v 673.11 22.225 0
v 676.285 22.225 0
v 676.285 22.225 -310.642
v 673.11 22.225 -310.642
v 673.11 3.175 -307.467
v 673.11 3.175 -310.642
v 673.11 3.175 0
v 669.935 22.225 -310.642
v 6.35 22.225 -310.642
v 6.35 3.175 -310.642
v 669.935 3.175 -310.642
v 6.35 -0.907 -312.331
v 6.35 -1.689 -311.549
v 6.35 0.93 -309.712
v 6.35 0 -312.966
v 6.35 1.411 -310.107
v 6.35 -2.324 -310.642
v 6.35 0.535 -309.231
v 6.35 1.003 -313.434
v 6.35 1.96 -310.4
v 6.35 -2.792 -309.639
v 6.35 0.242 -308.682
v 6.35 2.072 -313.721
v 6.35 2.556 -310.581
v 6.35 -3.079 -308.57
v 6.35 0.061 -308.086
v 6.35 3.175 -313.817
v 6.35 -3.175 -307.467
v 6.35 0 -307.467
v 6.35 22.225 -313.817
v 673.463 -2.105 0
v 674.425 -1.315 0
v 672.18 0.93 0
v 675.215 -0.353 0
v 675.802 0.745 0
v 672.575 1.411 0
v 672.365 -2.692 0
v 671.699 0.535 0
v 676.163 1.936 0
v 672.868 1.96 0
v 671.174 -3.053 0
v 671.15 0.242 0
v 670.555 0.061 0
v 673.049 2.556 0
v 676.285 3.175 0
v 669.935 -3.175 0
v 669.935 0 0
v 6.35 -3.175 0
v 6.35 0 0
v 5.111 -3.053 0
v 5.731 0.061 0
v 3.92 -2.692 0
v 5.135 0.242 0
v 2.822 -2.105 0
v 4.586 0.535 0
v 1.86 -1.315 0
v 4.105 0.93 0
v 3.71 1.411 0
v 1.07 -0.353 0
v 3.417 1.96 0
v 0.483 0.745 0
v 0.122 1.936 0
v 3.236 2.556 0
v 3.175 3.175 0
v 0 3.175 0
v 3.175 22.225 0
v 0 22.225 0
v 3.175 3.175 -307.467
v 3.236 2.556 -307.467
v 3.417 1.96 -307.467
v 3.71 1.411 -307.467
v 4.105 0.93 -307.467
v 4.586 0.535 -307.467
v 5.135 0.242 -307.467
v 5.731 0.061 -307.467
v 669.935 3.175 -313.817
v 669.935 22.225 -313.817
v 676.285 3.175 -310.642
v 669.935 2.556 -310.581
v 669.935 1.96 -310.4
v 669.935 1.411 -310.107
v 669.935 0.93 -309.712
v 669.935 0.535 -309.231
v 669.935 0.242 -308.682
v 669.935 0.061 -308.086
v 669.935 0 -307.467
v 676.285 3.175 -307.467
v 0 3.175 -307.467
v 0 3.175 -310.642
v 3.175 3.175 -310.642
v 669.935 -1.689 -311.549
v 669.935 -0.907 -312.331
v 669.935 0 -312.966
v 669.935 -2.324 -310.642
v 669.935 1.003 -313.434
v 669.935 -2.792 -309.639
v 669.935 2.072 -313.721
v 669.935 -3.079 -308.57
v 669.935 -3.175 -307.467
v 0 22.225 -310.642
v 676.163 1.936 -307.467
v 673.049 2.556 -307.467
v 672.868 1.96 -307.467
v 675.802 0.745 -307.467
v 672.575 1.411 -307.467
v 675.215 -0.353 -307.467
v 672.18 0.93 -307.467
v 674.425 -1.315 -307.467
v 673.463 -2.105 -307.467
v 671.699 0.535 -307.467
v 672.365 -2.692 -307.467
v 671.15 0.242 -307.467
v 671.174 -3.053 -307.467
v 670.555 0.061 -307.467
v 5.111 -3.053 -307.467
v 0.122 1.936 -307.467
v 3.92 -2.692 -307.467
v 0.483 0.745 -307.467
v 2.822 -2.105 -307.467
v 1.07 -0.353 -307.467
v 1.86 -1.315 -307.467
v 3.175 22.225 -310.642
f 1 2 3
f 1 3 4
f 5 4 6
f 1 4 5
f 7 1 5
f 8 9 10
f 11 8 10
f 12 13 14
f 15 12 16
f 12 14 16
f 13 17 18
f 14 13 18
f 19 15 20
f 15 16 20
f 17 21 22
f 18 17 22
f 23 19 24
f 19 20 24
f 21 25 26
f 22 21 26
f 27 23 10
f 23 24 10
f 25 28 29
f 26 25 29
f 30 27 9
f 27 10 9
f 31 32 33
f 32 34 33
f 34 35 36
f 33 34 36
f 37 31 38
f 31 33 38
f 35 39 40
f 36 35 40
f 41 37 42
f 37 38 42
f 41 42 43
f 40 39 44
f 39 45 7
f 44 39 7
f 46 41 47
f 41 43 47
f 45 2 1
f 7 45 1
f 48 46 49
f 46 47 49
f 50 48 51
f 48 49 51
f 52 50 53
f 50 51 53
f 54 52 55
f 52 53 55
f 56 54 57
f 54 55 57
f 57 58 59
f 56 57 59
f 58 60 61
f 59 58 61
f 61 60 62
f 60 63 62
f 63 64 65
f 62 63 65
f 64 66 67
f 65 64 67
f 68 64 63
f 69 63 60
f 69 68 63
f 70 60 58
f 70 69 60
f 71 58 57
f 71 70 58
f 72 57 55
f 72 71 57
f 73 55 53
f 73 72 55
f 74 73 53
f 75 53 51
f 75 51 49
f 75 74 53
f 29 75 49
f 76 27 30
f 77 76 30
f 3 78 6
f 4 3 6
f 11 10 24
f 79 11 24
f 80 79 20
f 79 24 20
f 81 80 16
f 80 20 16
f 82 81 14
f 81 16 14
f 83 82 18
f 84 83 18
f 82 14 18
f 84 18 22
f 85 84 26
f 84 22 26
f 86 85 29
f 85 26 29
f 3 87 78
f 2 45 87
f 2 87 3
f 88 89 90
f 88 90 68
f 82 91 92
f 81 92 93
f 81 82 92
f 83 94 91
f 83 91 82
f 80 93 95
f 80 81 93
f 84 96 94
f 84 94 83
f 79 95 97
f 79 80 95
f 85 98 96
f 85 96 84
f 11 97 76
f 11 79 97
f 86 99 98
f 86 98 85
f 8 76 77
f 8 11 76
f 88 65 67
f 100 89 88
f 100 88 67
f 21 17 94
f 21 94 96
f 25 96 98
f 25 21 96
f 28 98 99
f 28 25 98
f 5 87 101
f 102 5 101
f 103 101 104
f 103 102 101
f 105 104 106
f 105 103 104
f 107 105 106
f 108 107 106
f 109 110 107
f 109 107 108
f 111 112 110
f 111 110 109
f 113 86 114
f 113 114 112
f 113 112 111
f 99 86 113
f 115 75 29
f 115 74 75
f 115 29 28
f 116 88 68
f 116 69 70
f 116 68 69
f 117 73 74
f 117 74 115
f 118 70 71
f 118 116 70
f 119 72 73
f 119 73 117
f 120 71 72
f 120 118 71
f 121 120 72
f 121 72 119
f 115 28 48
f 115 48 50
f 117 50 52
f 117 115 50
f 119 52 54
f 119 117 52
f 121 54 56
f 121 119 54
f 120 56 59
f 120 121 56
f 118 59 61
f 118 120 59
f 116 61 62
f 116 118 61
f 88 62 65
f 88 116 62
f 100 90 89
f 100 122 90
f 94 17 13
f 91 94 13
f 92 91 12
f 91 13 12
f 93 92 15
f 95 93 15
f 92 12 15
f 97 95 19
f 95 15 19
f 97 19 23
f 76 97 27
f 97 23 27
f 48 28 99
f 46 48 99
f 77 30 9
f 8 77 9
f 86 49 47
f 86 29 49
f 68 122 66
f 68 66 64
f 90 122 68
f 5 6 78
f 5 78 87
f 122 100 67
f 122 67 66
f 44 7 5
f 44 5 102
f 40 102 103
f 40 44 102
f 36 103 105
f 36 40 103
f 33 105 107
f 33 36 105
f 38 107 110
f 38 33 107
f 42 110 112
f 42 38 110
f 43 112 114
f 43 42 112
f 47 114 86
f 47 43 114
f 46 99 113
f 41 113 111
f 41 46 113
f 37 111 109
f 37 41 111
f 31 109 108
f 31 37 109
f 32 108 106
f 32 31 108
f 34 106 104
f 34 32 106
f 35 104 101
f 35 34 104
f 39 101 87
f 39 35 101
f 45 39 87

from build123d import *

# Parameters (mm, degrees)
SKETCH1_W                      = 676.28516
SKETCH1_H                      = 310.642
BASE_FLANGE1_DEPTH             = 3.175
EDGE_FLANGE2_STRIP_W           = 19.05
EDGE_FLANGE2_STRIP_H           = 3.175
EDGE_FLANGE2_STRIP_CUT_DEPTH   = 310.642
EDGE_FLANGE2_STRIP_2_W         = 19.05
EDGE_FLANGE2_STRIP_2_H         = 3.175
EDGE_FLANGE2_STRIP_CUT_2_DEPTH = 310.642
EDGE_FLANGE2_DEPTH             = 310.642
EDGE_FLANGE2_BEND_DEPTH        = 310.642
EDGE_FLANGE3_DEPTH             = 676.28516
EDGE_FLANGE3_2_DEPTH           = 6.35
EDGE_FLANGE3_START             = 669.93516
EDGE_FLANGE3_3_DEPTH           = 6.35
EDGE_FLANGE3_START_2           = 6.35
EDGE_FLANGE3_4_DEPTH           = 663.58516


# Read off the part's stored shape, not the designer's step: Edge-Flange3
# Sheet-metal steps are written as plain solids
with BuildPart() as part:
    # Sketch1 → Base-Flange1 (new body)
    with BuildSketch(Plane(origin=(0, 0, 0), x_dir=(1, 0, 0), z_dir=(0, 1, 0))):
        with Locations((338.14258, 155.321)):
            Rectangle(SKETCH1_W, SKETCH1_H)
    extrude(amount=-BASE_FLANGE1_DEPTH)

    # Edge-Flange2 strip (across the edge) → Edge-Flange2 strip cut (cut)
    with BuildSketch(Plane(origin=(676.28516, 0, 0), x_dir=(-1, 0, 0), z_dir=(0, 0, -1))):
        with Locations((-3.175, -1.5875)):
            Rectangle(EDGE_FLANGE2_STRIP_W, EDGE_FLANGE2_STRIP_H)
    extrude(amount=EDGE_FLANGE2_STRIP_CUT_DEPTH, mode=Mode.SUBTRACT)

    # Edge-Flange2 strip 2 (across the edge) → Edge-Flange2 strip cut 2 (cut)
    with BuildSketch(Plane.XY.offset(-310.642)):
        with Locations((-3.175, -1.5875)):
            Rectangle(EDGE_FLANGE2_STRIP_2_W, EDGE_FLANGE2_STRIP_2_H)
    extrude(amount=EDGE_FLANGE2_STRIP_CUT_2_DEPTH, mode=Mode.SUBTRACT)

    # Edge-Flange2 section (across the edge) → Edge-Flange2 (add)
    with BuildSketch(Plane(origin=(676.28516, 0, 0), x_dir=(-1, 0, 0), z_dir=(0, 0, -1))):
        with BuildLine():
            Line((0, 3.175), (0, 22.225))
            Line((0, 22.225), (3.175, 22.225))
            Line((3.175, 22.225), (3.175, 3.175))
            ThreePointArc((3.175, 3.175), (4.10493597, 0.92993597), (6.35, 0))
            Line((6.35, 0), (6.35, -3.175))
            ThreePointArc((6.35, -3.175), (1.859871939, -1.315128061), (0, 3.175))
        make_face()
    extrude(amount=EDGE_FLANGE2_DEPTH)

    # Edge-Flange2 section 2 (across the edge) → Edge-Flange2 bend (add)
    with BuildSketch(Plane.XY.offset(-310.642)):
        with BuildLine():
            Line((0, 3.175), (0, 22.225))
            Line((0, 22.225), (3.175, 22.225))
            Line((3.175, 22.225), (3.175, 3.175))
            ThreePointArc((3.175, 3.175), (4.10493597, 0.92993597), (6.35, 0))
            Line((6.35, 0), (6.35, -3.175))
            ThreePointArc((6.35, -3.175), (1.859871939, -1.315128061), (0, 3.175))
        make_face()
    extrude(amount=EDGE_FLANGE2_BEND_DEPTH)

    # Edge-Flange3 outline → Edge-Flange3 (cut)
    with BuildSketch(Plane.YZ):
        with BuildLine():
            Line((3.175, -310.642), (3.175, -307.467))
            Line((3.175, -307.467), (0, -307.467))
            ThreePointArc((0, -307.467), (0.92993597, -309.71206403), (3.175, -310.642))
        make_face()
        with BuildLine():
            ThreePointArc((-2.324261315, -310.642), (-2.958628997, -309.110500936), (-3.175, -307.467))
            Line((-3.175, -307.467), (-3.175, -310.642))
            Line((-3.175, -310.642), (-2.324261315, -310.642))
        make_face()
    extrude(amount=EDGE_FLANGE3_DEPTH, mode=Mode.SUBTRACT)

    # Edge-Flange3 2 outline → Edge-Flange3 2 (cut)
    with BuildSketch(Plane.YZ):
        with BuildLine():
            ThreePointArc((3.175, -310.642), (0.92993597, -309.71206403), (0, -307.467))
            Line((0, -307.467), (-3.175, -307.467))
            ThreePointArc((-3.175, -307.467), (-2.958628997, -309.110500936), (-2.324261315, -310.642))
            Line((-2.324261315, -310.642), (3.175, -310.642))
        make_face()
    extrude(amount=EDGE_FLANGE3_2_DEPTH, mode=Mode.SUBTRACT)

    # Edge-Flange3 3 outline → Edge-Flange3 3 (cut)
    with BuildSketch(Plane.YZ.offset(EDGE_FLANGE3_START)):
        with BuildLine():
            ThreePointArc((3.175, -310.642), (0.92993597, -309.71206403), (0, -307.467))
            Line((0, -307.467), (-3.175, -307.467))
            ThreePointArc((-3.175, -307.467), (-2.958628997, -309.110500936), (-2.324261315, -310.642))
            Line((-2.324261315, -310.642), (3.175, -310.642))
        make_face()
    extrude(amount=EDGE_FLANGE3_3_DEPTH, mode=Mode.SUBTRACT)

    # Edge-Flange3 4 outline → Edge-Flange3 4 (add)
    with BuildSketch(Plane.YZ.offset(EDGE_FLANGE3_START_2)):
        with BuildLine():
            Line((0, -307.467), (0, -310.642))
            Line((0, -310.642), (-2.324261315, -310.642))
            ThreePointArc((-2.324261315, -310.642), (-1e-09, -312.966261314), (3.175, -313.817))
            Line((3.175, -313.817), (22.225, -313.817))
            Line((22.225, -313.817), (22.225, -310.642))
            Line((22.225, -310.642), (3.175, -310.642))
            ThreePointArc((3.175, -310.642), (0.92993597, -309.71206403), (0, -307.467))
        make_face()
    extrude(amount=EDGE_FLANGE3_4_DEPTH)


solid = part.part
